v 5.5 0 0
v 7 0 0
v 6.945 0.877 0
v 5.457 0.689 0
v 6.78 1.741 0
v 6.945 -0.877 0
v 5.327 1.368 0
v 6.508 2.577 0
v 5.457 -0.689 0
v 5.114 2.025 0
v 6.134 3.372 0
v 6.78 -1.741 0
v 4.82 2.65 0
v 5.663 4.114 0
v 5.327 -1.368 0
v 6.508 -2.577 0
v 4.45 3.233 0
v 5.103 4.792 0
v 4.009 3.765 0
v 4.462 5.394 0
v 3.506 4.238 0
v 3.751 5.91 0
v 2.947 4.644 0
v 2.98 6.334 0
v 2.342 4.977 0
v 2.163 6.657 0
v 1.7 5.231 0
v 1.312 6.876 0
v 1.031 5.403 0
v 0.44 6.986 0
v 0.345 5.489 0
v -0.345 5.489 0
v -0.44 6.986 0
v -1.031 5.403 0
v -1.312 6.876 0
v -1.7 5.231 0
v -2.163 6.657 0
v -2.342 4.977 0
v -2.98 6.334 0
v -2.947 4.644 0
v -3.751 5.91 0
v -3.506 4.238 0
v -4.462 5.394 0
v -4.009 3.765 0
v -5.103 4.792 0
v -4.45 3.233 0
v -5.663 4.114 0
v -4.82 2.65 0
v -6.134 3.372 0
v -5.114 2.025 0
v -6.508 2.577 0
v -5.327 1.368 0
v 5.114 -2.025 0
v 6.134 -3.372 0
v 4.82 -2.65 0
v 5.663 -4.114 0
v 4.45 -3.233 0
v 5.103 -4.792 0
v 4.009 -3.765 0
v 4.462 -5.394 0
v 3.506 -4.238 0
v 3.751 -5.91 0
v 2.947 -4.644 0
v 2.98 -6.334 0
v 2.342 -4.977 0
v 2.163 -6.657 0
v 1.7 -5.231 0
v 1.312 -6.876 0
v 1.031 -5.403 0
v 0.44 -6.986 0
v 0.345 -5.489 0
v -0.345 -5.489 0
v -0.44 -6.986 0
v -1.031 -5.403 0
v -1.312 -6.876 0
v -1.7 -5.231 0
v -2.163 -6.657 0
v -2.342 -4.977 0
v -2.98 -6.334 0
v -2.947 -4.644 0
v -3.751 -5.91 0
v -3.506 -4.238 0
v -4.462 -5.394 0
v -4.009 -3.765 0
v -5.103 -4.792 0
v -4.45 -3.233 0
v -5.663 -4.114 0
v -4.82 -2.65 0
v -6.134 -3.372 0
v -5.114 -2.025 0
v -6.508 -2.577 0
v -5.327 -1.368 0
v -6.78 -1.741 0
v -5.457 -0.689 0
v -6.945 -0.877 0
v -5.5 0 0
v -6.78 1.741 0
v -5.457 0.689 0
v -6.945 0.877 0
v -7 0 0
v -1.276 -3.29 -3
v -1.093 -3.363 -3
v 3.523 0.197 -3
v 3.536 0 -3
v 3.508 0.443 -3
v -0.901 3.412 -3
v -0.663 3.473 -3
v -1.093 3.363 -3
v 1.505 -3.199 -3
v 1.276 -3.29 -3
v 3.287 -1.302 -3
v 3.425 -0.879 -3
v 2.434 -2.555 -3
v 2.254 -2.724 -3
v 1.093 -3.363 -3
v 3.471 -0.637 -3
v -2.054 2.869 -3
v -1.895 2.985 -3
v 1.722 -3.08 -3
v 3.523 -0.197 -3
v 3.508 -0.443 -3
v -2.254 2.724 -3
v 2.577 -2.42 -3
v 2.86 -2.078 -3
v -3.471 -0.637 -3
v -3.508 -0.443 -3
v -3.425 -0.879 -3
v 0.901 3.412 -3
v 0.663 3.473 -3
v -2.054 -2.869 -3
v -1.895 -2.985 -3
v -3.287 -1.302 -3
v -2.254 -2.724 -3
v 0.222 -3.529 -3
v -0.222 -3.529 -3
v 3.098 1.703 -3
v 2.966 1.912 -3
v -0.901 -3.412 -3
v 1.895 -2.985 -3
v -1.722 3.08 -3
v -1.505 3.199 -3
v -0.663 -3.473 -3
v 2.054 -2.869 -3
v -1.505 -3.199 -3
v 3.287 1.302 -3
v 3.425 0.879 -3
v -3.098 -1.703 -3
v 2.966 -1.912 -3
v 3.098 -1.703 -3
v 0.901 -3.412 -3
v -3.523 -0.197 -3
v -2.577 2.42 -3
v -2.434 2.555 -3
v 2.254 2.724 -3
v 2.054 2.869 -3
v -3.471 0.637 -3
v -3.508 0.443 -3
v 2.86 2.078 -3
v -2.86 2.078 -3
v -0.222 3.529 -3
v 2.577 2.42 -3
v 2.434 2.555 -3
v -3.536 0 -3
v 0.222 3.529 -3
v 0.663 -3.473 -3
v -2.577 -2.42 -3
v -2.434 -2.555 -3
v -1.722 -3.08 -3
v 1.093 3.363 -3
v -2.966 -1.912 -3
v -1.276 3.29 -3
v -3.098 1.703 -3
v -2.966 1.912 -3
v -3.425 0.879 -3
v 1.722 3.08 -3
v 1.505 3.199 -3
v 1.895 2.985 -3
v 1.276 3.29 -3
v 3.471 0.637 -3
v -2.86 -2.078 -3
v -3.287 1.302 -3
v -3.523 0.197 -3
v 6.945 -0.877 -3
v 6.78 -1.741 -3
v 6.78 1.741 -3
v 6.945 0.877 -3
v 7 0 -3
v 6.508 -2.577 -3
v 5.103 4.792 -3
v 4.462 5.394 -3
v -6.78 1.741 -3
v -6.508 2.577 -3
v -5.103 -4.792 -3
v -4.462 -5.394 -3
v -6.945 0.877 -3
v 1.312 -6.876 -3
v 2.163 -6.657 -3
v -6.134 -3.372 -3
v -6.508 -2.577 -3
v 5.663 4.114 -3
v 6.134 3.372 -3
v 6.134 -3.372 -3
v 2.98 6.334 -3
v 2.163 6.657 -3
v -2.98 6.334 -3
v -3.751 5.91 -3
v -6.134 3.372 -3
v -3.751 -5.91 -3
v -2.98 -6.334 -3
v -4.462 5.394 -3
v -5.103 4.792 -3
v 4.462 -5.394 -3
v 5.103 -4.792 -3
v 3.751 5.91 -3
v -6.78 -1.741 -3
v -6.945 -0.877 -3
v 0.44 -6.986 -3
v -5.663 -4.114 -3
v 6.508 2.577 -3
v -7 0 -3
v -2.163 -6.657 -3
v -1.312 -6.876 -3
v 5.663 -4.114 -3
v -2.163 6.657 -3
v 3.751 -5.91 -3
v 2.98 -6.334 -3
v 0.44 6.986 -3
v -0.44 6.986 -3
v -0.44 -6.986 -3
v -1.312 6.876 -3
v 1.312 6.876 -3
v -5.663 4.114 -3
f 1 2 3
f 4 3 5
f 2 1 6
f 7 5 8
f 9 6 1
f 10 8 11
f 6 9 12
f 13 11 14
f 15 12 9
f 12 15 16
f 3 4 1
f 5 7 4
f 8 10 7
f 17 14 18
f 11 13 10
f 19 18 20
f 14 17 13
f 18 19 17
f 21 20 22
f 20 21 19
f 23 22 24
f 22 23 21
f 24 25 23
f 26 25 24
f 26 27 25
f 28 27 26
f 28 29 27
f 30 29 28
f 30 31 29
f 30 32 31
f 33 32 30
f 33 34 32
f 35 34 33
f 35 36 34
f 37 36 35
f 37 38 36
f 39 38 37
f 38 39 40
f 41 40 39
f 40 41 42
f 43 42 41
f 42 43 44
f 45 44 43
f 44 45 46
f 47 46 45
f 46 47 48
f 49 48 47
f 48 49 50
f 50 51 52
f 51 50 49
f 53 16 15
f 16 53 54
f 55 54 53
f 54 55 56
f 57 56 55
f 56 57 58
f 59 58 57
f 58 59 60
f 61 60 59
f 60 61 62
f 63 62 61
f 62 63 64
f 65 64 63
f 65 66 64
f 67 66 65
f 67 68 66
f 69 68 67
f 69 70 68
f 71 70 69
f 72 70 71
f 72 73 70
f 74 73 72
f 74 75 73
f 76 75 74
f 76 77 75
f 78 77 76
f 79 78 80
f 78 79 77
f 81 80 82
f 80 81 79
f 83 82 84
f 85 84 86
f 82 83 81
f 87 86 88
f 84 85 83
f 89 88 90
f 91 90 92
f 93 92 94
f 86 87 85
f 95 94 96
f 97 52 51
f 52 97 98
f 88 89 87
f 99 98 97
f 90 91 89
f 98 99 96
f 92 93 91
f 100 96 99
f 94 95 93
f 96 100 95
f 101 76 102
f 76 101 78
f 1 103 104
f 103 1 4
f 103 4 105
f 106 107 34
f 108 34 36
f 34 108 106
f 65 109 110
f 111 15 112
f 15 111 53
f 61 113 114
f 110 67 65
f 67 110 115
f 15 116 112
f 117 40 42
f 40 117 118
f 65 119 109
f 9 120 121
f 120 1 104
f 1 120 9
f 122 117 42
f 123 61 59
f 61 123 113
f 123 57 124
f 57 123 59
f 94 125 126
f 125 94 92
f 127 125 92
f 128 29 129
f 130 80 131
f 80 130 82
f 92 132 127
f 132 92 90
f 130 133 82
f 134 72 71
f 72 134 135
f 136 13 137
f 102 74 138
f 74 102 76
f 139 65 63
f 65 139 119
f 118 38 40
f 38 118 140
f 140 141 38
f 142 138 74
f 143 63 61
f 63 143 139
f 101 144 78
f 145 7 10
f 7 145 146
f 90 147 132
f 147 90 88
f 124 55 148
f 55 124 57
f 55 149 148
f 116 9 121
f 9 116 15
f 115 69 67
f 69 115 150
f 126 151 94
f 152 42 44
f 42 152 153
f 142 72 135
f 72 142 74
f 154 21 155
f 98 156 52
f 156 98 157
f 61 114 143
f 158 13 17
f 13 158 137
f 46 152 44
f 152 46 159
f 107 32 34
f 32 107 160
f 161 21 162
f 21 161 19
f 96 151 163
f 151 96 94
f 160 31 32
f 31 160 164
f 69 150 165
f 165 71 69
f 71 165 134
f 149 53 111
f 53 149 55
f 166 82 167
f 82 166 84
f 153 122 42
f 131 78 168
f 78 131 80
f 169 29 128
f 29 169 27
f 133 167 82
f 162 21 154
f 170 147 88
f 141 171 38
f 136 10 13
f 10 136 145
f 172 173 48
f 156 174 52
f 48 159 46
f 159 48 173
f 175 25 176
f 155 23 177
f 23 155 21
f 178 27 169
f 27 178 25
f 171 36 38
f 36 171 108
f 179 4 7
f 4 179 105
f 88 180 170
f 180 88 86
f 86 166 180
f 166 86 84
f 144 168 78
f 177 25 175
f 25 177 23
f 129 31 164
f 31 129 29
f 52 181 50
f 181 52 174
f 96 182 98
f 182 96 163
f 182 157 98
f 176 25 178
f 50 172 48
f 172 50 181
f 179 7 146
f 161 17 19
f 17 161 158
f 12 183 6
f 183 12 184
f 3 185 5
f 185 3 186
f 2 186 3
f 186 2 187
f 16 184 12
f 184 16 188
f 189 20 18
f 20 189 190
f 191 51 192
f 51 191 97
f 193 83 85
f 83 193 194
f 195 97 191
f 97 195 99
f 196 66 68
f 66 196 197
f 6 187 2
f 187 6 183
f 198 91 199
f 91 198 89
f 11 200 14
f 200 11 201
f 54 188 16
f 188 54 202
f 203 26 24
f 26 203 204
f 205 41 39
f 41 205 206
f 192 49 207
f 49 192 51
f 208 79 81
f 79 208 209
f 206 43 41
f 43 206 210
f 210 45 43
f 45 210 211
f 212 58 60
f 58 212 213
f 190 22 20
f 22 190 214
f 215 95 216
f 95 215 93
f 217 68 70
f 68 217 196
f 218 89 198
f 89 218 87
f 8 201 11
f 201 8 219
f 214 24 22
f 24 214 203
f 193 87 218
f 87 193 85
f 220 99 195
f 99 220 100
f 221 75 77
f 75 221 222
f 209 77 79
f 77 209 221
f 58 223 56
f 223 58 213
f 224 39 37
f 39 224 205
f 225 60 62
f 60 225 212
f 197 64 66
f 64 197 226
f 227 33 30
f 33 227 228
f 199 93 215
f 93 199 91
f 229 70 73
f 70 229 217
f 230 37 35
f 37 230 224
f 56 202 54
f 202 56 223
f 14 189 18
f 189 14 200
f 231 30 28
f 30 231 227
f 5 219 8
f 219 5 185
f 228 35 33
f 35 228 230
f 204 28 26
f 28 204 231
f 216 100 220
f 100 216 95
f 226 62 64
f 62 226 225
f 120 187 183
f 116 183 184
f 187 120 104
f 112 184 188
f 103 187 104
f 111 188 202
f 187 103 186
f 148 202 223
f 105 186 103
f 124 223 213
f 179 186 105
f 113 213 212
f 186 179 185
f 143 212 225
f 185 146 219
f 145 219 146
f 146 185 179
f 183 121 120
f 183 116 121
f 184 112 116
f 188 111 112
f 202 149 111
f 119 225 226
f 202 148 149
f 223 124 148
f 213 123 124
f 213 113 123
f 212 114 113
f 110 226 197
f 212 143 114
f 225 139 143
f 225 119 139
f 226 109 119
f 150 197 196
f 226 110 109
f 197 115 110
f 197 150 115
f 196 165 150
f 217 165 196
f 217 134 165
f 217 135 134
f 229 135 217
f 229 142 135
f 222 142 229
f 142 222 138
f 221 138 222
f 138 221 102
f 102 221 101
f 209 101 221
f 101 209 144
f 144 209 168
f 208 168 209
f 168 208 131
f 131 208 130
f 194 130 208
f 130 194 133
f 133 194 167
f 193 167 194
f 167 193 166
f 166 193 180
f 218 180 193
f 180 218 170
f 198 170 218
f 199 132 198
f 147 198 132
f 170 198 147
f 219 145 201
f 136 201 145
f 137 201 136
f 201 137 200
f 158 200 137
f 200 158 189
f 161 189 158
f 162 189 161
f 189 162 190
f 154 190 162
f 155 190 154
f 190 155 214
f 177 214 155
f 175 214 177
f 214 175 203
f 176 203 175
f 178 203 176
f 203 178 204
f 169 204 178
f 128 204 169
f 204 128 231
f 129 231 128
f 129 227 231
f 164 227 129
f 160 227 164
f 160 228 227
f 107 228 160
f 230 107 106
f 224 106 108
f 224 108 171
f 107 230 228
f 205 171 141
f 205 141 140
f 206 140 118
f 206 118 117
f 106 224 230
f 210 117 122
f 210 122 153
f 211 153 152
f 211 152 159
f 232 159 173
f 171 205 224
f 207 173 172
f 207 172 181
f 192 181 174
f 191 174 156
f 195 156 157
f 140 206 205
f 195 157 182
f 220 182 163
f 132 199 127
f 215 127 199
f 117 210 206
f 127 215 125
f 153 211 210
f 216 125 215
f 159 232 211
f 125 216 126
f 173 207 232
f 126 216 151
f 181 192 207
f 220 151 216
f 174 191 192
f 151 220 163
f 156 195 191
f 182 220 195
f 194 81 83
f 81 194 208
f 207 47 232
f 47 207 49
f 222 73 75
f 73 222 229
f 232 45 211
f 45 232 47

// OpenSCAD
$fn = 50;


difference() {
	union() {
		translate(v = [0, 0, -3.0000000000]) {
			cylinder(h = 3, r = 7.0000000000);
		}
		cylinder(h = 0, r = 13.0000000000);
	}
	union() {
		translate(v = [0, 0, 0]) {
			rotate(a = [0, 0, 0]) {
				difference() {
					union() {
						#translate(v = [0, 0, -3.0000000000]) {
							cylinder(h = 3, r = 2.2500000000);
						}
						#translate(v = [0, 0, -4.2000000000]) {
							cylinder(h = 4.2000000000, r1 = 2.7500000000, r2 = 5.5000000000);
						}
						#translate(v = [0, 0, -3.0000000000]) {
							cylinder(h = 3, r = 2.7500000000);
						}
						#translate(v = [0, 0, -3.0000000000]) {
							cylinder(h = 3, r = 2.2500000000);
						}
					}
					union();
				}
			}
		}
	}
}
